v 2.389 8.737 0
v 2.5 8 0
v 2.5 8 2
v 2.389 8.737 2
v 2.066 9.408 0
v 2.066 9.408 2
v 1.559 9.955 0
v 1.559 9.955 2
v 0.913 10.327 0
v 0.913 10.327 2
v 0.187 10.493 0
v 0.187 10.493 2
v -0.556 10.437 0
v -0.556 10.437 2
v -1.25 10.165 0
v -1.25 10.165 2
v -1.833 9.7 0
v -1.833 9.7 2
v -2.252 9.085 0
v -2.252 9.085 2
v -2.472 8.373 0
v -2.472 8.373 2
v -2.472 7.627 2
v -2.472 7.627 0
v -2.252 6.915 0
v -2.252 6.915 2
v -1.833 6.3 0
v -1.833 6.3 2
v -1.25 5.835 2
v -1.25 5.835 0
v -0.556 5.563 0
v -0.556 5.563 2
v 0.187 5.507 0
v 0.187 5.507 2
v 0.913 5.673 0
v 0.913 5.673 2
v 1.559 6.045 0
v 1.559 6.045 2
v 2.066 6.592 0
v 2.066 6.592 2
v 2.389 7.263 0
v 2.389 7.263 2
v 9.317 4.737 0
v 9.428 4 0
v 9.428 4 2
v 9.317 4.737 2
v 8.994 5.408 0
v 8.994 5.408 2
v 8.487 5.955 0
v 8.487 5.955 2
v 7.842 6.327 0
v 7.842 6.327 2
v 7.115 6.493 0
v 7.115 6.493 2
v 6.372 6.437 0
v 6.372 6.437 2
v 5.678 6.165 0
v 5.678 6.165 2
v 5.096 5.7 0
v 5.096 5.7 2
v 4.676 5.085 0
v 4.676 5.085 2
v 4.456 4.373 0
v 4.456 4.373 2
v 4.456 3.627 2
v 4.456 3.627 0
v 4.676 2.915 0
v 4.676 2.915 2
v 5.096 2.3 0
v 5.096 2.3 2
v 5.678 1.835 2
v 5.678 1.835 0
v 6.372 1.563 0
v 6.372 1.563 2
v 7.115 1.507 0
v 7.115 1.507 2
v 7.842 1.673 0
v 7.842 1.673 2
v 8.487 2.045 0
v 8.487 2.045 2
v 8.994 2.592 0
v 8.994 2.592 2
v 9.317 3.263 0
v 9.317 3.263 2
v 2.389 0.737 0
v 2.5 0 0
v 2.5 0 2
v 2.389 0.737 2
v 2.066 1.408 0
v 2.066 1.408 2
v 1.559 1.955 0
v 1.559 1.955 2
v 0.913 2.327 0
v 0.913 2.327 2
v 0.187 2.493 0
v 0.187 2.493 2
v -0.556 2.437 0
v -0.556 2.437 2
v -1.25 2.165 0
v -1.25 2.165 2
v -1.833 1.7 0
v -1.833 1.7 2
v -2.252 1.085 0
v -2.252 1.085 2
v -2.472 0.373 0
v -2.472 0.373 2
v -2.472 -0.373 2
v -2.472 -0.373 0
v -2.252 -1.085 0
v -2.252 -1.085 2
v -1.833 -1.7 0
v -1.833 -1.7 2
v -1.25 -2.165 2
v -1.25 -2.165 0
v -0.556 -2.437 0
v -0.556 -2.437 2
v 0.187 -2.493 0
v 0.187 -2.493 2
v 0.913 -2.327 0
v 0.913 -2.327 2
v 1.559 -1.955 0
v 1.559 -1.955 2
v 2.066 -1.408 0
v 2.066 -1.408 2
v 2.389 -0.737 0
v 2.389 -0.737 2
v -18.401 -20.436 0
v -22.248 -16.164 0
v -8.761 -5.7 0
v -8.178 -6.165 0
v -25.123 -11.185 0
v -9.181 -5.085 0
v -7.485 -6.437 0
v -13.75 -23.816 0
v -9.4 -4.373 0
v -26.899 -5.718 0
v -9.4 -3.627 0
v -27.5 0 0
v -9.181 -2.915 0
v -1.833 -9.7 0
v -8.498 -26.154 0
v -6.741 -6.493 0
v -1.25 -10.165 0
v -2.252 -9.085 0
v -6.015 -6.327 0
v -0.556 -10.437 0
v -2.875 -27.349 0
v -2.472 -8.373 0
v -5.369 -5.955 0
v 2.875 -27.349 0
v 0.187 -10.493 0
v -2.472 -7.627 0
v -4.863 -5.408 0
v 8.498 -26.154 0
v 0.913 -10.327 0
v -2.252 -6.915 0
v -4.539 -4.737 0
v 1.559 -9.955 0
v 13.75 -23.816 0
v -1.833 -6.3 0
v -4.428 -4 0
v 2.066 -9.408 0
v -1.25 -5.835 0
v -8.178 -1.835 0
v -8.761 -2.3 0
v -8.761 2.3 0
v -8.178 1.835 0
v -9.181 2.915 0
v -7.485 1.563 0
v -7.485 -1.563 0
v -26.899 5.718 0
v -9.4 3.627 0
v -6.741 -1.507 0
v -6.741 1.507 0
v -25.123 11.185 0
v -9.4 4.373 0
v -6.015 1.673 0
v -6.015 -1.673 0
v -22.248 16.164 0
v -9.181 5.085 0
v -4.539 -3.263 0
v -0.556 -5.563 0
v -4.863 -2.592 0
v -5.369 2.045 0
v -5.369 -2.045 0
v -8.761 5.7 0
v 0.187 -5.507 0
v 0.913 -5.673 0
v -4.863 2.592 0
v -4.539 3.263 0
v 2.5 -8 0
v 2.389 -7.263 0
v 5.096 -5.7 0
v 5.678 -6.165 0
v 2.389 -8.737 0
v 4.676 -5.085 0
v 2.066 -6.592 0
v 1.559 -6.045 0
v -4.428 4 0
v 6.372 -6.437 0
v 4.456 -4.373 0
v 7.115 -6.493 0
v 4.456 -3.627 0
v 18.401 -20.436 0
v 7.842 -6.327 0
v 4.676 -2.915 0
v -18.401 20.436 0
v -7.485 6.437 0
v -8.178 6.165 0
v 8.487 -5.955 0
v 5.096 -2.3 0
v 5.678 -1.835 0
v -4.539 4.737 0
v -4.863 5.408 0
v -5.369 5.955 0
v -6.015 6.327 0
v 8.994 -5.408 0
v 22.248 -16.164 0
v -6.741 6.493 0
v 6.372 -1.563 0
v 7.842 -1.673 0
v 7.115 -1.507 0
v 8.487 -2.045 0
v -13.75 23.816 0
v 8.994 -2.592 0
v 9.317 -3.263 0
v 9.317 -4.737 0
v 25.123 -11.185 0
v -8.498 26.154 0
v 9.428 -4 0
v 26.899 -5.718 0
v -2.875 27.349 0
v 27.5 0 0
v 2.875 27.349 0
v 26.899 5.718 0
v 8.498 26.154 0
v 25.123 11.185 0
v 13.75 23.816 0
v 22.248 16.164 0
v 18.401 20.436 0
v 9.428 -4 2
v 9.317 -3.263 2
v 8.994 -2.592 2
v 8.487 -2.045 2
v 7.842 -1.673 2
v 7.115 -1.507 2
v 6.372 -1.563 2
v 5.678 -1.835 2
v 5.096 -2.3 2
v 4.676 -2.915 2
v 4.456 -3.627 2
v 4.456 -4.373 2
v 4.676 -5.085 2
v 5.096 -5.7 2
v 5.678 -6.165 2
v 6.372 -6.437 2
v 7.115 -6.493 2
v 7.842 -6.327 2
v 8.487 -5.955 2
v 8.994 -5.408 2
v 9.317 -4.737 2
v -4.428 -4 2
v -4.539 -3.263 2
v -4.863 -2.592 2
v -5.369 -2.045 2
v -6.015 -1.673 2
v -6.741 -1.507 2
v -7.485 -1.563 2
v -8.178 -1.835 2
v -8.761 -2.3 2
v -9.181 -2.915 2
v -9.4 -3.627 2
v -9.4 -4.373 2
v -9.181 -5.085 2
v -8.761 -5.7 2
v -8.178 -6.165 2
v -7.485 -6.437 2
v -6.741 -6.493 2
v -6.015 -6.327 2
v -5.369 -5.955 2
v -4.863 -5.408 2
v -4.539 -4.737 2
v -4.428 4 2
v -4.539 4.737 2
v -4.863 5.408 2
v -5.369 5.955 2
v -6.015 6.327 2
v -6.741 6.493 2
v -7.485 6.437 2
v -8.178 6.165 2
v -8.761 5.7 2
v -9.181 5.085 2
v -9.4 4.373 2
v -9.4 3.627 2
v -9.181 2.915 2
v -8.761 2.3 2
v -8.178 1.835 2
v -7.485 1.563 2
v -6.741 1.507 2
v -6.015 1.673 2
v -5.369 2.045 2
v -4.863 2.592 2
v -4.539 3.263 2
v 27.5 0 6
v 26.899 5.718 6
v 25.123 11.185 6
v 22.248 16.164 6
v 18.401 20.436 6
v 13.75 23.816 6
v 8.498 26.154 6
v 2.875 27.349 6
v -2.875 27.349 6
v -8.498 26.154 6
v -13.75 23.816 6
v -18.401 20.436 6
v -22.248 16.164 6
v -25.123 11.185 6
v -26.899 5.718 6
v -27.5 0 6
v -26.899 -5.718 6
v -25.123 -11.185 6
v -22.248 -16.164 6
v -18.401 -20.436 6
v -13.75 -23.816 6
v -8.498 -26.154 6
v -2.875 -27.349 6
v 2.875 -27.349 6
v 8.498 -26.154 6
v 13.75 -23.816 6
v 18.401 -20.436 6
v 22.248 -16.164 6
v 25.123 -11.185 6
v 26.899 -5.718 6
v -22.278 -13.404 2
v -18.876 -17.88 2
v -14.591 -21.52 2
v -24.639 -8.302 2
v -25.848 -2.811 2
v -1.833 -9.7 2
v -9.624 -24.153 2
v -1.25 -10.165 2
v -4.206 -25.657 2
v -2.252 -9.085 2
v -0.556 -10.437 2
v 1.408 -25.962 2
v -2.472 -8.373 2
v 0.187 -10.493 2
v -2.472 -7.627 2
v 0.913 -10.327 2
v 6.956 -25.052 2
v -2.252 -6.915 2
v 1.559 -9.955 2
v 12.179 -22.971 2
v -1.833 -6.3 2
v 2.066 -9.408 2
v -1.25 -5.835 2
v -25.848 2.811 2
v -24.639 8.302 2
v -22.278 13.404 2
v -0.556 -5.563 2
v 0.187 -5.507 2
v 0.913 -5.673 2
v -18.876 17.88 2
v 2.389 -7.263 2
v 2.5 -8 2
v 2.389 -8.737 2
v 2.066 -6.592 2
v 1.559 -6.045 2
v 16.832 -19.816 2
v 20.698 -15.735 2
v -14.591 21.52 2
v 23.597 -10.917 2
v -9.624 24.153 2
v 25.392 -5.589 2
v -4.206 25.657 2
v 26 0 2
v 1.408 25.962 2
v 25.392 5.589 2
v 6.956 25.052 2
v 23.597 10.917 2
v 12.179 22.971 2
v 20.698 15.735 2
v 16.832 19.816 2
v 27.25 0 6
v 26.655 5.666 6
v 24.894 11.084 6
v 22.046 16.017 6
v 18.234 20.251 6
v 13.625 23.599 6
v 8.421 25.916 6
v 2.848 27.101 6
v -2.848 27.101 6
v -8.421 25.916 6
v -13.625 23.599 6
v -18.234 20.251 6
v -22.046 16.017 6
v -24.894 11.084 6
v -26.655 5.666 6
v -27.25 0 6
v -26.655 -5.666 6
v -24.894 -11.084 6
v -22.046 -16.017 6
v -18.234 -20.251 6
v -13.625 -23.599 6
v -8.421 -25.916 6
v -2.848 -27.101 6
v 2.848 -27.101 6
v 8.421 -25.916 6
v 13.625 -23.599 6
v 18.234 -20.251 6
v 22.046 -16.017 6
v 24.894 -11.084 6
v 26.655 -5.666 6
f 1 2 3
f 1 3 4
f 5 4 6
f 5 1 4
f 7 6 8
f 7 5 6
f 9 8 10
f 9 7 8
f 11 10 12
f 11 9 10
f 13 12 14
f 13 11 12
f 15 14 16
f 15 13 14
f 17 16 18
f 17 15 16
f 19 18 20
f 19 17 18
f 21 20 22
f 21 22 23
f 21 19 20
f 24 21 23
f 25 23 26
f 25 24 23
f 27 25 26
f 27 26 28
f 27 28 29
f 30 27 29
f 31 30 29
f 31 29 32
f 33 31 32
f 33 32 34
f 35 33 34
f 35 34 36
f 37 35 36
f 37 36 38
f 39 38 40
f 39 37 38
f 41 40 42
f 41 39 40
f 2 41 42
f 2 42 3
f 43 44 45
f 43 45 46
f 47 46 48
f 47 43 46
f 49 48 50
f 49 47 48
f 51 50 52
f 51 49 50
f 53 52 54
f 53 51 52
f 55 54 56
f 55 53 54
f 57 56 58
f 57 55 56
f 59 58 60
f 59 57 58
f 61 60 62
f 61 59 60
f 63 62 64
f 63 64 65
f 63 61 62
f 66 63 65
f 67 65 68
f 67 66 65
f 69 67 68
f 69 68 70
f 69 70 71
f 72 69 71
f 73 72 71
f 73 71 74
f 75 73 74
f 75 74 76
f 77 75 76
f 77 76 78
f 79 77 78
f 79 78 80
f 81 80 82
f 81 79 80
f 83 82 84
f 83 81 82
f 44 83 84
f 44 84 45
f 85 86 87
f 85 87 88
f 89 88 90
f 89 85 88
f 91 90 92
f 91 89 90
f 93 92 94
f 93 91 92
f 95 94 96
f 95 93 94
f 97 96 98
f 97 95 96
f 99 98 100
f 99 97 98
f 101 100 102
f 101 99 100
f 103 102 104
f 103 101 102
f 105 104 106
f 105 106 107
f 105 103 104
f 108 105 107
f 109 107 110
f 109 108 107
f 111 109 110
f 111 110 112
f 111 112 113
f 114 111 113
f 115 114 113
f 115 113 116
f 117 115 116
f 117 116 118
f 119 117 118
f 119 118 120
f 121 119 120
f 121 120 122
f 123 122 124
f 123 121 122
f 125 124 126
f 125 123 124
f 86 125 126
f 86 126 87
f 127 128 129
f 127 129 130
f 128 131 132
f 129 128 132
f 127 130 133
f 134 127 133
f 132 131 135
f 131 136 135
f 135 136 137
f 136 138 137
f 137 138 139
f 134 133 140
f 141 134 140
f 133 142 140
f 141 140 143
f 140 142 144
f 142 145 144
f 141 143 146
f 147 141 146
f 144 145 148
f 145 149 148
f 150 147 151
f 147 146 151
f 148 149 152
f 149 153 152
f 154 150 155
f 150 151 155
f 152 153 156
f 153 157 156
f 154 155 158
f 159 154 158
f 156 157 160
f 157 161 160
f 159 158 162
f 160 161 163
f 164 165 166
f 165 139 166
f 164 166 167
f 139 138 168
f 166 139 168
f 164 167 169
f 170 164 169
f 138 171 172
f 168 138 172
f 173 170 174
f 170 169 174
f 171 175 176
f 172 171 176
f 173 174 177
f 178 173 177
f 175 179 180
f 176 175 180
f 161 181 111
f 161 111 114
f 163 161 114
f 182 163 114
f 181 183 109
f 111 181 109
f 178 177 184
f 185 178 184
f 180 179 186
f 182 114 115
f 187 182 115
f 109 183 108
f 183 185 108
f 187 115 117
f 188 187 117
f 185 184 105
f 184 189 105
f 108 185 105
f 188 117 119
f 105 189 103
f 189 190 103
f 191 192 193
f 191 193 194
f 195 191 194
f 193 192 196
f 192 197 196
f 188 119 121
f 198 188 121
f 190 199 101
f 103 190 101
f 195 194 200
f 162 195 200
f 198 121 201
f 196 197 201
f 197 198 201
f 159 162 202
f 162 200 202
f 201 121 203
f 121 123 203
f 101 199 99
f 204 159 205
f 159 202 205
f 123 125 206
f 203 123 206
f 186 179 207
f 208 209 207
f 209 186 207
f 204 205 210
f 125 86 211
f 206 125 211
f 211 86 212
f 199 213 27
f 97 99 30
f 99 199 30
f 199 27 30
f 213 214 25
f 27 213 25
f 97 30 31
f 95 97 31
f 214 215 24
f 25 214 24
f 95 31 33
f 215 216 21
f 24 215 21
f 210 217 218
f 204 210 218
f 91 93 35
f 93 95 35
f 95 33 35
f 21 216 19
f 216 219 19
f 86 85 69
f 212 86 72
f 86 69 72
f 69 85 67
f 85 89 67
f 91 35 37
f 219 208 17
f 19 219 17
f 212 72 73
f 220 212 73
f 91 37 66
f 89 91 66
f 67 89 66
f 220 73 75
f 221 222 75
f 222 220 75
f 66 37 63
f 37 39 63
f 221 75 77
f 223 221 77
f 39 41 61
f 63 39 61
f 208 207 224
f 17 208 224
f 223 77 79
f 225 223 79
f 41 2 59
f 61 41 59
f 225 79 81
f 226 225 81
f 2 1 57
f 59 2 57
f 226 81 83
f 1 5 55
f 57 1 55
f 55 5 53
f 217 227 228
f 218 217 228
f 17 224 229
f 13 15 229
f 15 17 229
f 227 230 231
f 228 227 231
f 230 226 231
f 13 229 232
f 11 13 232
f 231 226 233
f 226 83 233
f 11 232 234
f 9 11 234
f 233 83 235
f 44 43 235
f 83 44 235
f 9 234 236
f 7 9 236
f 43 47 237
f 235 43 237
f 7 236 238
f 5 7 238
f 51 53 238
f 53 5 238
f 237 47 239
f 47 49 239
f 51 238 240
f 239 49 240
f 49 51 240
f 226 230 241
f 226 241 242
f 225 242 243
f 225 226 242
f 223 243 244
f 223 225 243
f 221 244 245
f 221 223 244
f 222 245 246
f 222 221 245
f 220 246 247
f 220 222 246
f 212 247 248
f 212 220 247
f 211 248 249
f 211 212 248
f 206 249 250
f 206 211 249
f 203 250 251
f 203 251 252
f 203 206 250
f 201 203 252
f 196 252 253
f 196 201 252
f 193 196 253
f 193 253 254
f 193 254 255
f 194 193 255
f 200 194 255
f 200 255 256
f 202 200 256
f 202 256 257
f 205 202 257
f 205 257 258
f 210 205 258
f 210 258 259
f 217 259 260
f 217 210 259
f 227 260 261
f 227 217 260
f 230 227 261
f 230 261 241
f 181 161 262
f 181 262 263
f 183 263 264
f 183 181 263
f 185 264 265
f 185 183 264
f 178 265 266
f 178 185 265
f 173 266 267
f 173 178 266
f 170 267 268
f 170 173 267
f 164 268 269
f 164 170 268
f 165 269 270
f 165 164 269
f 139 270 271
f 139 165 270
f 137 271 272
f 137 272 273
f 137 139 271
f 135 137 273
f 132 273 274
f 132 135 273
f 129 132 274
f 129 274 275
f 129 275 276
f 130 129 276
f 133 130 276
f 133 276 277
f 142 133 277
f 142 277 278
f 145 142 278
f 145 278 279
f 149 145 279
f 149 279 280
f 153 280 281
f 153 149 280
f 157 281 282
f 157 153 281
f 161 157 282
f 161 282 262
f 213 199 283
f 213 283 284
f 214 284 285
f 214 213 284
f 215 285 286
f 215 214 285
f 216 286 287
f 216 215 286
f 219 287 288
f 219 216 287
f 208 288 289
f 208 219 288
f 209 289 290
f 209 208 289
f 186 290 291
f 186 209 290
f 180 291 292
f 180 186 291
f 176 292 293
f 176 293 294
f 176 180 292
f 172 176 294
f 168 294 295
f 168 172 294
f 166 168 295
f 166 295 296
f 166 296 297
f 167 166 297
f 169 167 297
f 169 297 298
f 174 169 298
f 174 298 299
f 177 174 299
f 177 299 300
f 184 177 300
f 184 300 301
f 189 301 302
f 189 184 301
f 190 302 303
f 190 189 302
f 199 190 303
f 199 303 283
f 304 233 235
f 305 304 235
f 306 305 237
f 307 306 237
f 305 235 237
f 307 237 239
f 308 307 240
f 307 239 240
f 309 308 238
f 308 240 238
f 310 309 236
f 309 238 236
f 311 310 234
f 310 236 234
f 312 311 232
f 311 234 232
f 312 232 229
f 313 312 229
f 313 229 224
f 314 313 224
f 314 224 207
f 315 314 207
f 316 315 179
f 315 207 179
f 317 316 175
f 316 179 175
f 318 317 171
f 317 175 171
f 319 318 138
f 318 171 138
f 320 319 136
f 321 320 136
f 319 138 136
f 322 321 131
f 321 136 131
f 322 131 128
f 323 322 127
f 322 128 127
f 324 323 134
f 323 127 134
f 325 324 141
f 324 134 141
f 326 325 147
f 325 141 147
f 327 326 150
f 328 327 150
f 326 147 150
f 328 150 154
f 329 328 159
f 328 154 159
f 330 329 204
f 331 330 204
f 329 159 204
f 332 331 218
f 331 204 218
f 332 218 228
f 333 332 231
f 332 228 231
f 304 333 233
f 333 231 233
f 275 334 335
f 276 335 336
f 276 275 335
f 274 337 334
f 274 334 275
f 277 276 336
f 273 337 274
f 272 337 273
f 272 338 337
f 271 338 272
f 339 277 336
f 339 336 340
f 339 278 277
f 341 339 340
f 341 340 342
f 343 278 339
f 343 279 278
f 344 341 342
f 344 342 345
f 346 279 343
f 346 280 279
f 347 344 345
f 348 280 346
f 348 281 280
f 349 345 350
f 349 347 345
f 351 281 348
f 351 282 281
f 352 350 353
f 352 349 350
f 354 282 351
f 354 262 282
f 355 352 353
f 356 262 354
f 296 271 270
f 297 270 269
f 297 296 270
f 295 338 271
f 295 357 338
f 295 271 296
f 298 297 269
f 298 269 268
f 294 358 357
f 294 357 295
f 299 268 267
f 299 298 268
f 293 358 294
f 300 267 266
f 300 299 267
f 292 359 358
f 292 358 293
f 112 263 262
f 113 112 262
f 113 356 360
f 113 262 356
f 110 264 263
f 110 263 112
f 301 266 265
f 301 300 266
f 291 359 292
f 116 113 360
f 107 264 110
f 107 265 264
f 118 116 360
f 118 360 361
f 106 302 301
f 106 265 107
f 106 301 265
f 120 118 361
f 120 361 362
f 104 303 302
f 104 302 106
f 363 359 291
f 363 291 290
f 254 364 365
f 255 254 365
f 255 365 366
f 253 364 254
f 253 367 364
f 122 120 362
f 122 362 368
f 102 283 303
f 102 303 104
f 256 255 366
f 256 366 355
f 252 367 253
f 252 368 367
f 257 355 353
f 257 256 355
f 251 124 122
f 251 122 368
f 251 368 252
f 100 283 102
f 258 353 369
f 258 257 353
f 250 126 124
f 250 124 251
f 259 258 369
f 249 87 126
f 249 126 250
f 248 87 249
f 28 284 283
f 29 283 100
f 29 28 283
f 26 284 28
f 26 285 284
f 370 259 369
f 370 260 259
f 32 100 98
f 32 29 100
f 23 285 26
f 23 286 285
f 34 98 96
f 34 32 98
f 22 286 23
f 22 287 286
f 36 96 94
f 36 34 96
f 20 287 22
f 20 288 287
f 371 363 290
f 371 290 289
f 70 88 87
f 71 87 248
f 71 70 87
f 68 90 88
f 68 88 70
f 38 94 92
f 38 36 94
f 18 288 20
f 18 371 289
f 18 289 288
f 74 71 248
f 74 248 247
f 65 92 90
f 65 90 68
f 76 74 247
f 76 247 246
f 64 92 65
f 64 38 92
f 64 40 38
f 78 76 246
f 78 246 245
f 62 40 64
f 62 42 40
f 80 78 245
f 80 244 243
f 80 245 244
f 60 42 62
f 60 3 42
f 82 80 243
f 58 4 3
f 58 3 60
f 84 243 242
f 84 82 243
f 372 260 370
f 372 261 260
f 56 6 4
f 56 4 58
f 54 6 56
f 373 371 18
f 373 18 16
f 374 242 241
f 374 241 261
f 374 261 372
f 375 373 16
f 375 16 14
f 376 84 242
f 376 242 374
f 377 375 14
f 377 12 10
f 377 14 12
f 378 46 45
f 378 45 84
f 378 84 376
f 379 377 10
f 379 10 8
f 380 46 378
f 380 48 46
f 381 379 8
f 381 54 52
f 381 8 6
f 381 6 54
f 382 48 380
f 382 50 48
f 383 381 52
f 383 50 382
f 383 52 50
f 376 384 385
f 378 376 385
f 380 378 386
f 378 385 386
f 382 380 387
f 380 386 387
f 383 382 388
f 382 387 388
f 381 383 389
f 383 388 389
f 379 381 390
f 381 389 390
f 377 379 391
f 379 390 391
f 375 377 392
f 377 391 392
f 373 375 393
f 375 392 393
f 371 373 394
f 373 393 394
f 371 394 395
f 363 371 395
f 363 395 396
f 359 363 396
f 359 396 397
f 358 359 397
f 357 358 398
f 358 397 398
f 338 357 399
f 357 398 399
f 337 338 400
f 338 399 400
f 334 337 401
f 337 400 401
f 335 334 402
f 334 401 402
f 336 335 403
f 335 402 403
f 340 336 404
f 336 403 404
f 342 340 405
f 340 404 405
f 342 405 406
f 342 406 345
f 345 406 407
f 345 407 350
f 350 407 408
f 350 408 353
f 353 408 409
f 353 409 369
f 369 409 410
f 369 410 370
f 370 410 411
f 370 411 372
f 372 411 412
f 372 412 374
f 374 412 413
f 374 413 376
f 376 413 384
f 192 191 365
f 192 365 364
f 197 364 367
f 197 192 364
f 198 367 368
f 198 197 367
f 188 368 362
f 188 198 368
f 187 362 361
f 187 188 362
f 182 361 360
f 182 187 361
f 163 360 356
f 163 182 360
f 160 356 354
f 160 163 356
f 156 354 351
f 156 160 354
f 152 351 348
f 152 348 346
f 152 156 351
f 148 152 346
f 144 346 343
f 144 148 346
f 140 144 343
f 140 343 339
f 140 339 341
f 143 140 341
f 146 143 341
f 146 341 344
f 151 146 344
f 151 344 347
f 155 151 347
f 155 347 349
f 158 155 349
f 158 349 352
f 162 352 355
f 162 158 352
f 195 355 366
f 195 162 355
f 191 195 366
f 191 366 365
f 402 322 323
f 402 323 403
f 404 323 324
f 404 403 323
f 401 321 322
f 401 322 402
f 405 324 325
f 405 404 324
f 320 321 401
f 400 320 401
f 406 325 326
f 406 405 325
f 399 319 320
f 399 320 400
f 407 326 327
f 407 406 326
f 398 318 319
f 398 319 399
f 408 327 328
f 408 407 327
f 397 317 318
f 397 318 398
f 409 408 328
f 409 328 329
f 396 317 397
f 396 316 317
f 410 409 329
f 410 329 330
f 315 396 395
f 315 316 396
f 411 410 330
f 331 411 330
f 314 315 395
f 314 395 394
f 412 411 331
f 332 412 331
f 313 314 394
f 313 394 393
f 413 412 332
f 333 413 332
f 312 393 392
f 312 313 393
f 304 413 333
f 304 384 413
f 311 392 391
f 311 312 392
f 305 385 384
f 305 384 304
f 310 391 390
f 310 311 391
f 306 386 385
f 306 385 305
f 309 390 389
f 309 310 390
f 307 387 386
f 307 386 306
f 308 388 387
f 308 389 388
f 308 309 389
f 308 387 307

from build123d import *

# Parameters (mm, degrees)
F0_R     = 26
F0_R_2   = 12
F0_R_3   = 2.5
F1_DEPTH = 2
F0_R_4   = 27.5
F2_DEPTH = 6
F3_SIZE2 = 1.24999
F3_SIZE  = 3.99999


# Not quite as in the source:
# - a fillet or chamfer is up to 0.001 mm smaller than in the source, because OpenCascade refuses the exact size


with BuildPart() as f1:
    # F0 (on Top) → F1 (new body)
    with BuildSketch(Plane.XY):
        Circle(F0_R)
        Circle(F0_R_2, mode=Mode.SUBTRACT)
        Circle(F0_R_2)
        with Locations((-6.9282032303, -4)):
            Circle(F0_R_3, mode=Mode.SUBTRACT)
        with Locations((0, -8)):
            Circle(F0_R_3, mode=Mode.SUBTRACT)
        with Locations((6.9282032303, -4)):
            Circle(F0_R_3, mode=Mode.SUBTRACT)
        with Locations((-6.9282032303, 4)):
            Circle(F0_R_3, mode=Mode.SUBTRACT)
        Circle(F0_R_3, mode=Mode.SUBTRACT)
        with Locations((6.9282032303, 4)):
            Circle(F0_R_3, mode=Mode.SUBTRACT)
        with Locations((0, 8)):
            Circle(F0_R_3, mode=Mode.SUBTRACT)
    extrude(amount=F1_DEPTH)

    # F0 (on Top) → F2 (join)
    with BuildSketch(Plane.XY):
        Circle(F0_R_4)
        Circle(F0_R, mode=Mode.SUBTRACT)
    extrude(amount=F2_DEPTH)

    # F3 (size 4 and 1.25 in the source; OpenCascade refuses exactly that, so slightly less here)
    f3_edges = [f1.edges().sort_by_distance(p)[0] for p in [
        (-26, 0, 6),
    ]]
    f3_side = f1.faces().sort_by_distance((-26, 0, 4))[0]
    chamfer(f3_edges, length=F3_SIZE, length2=F3_SIZE2, reference=f3_side)


solid = f1.part
